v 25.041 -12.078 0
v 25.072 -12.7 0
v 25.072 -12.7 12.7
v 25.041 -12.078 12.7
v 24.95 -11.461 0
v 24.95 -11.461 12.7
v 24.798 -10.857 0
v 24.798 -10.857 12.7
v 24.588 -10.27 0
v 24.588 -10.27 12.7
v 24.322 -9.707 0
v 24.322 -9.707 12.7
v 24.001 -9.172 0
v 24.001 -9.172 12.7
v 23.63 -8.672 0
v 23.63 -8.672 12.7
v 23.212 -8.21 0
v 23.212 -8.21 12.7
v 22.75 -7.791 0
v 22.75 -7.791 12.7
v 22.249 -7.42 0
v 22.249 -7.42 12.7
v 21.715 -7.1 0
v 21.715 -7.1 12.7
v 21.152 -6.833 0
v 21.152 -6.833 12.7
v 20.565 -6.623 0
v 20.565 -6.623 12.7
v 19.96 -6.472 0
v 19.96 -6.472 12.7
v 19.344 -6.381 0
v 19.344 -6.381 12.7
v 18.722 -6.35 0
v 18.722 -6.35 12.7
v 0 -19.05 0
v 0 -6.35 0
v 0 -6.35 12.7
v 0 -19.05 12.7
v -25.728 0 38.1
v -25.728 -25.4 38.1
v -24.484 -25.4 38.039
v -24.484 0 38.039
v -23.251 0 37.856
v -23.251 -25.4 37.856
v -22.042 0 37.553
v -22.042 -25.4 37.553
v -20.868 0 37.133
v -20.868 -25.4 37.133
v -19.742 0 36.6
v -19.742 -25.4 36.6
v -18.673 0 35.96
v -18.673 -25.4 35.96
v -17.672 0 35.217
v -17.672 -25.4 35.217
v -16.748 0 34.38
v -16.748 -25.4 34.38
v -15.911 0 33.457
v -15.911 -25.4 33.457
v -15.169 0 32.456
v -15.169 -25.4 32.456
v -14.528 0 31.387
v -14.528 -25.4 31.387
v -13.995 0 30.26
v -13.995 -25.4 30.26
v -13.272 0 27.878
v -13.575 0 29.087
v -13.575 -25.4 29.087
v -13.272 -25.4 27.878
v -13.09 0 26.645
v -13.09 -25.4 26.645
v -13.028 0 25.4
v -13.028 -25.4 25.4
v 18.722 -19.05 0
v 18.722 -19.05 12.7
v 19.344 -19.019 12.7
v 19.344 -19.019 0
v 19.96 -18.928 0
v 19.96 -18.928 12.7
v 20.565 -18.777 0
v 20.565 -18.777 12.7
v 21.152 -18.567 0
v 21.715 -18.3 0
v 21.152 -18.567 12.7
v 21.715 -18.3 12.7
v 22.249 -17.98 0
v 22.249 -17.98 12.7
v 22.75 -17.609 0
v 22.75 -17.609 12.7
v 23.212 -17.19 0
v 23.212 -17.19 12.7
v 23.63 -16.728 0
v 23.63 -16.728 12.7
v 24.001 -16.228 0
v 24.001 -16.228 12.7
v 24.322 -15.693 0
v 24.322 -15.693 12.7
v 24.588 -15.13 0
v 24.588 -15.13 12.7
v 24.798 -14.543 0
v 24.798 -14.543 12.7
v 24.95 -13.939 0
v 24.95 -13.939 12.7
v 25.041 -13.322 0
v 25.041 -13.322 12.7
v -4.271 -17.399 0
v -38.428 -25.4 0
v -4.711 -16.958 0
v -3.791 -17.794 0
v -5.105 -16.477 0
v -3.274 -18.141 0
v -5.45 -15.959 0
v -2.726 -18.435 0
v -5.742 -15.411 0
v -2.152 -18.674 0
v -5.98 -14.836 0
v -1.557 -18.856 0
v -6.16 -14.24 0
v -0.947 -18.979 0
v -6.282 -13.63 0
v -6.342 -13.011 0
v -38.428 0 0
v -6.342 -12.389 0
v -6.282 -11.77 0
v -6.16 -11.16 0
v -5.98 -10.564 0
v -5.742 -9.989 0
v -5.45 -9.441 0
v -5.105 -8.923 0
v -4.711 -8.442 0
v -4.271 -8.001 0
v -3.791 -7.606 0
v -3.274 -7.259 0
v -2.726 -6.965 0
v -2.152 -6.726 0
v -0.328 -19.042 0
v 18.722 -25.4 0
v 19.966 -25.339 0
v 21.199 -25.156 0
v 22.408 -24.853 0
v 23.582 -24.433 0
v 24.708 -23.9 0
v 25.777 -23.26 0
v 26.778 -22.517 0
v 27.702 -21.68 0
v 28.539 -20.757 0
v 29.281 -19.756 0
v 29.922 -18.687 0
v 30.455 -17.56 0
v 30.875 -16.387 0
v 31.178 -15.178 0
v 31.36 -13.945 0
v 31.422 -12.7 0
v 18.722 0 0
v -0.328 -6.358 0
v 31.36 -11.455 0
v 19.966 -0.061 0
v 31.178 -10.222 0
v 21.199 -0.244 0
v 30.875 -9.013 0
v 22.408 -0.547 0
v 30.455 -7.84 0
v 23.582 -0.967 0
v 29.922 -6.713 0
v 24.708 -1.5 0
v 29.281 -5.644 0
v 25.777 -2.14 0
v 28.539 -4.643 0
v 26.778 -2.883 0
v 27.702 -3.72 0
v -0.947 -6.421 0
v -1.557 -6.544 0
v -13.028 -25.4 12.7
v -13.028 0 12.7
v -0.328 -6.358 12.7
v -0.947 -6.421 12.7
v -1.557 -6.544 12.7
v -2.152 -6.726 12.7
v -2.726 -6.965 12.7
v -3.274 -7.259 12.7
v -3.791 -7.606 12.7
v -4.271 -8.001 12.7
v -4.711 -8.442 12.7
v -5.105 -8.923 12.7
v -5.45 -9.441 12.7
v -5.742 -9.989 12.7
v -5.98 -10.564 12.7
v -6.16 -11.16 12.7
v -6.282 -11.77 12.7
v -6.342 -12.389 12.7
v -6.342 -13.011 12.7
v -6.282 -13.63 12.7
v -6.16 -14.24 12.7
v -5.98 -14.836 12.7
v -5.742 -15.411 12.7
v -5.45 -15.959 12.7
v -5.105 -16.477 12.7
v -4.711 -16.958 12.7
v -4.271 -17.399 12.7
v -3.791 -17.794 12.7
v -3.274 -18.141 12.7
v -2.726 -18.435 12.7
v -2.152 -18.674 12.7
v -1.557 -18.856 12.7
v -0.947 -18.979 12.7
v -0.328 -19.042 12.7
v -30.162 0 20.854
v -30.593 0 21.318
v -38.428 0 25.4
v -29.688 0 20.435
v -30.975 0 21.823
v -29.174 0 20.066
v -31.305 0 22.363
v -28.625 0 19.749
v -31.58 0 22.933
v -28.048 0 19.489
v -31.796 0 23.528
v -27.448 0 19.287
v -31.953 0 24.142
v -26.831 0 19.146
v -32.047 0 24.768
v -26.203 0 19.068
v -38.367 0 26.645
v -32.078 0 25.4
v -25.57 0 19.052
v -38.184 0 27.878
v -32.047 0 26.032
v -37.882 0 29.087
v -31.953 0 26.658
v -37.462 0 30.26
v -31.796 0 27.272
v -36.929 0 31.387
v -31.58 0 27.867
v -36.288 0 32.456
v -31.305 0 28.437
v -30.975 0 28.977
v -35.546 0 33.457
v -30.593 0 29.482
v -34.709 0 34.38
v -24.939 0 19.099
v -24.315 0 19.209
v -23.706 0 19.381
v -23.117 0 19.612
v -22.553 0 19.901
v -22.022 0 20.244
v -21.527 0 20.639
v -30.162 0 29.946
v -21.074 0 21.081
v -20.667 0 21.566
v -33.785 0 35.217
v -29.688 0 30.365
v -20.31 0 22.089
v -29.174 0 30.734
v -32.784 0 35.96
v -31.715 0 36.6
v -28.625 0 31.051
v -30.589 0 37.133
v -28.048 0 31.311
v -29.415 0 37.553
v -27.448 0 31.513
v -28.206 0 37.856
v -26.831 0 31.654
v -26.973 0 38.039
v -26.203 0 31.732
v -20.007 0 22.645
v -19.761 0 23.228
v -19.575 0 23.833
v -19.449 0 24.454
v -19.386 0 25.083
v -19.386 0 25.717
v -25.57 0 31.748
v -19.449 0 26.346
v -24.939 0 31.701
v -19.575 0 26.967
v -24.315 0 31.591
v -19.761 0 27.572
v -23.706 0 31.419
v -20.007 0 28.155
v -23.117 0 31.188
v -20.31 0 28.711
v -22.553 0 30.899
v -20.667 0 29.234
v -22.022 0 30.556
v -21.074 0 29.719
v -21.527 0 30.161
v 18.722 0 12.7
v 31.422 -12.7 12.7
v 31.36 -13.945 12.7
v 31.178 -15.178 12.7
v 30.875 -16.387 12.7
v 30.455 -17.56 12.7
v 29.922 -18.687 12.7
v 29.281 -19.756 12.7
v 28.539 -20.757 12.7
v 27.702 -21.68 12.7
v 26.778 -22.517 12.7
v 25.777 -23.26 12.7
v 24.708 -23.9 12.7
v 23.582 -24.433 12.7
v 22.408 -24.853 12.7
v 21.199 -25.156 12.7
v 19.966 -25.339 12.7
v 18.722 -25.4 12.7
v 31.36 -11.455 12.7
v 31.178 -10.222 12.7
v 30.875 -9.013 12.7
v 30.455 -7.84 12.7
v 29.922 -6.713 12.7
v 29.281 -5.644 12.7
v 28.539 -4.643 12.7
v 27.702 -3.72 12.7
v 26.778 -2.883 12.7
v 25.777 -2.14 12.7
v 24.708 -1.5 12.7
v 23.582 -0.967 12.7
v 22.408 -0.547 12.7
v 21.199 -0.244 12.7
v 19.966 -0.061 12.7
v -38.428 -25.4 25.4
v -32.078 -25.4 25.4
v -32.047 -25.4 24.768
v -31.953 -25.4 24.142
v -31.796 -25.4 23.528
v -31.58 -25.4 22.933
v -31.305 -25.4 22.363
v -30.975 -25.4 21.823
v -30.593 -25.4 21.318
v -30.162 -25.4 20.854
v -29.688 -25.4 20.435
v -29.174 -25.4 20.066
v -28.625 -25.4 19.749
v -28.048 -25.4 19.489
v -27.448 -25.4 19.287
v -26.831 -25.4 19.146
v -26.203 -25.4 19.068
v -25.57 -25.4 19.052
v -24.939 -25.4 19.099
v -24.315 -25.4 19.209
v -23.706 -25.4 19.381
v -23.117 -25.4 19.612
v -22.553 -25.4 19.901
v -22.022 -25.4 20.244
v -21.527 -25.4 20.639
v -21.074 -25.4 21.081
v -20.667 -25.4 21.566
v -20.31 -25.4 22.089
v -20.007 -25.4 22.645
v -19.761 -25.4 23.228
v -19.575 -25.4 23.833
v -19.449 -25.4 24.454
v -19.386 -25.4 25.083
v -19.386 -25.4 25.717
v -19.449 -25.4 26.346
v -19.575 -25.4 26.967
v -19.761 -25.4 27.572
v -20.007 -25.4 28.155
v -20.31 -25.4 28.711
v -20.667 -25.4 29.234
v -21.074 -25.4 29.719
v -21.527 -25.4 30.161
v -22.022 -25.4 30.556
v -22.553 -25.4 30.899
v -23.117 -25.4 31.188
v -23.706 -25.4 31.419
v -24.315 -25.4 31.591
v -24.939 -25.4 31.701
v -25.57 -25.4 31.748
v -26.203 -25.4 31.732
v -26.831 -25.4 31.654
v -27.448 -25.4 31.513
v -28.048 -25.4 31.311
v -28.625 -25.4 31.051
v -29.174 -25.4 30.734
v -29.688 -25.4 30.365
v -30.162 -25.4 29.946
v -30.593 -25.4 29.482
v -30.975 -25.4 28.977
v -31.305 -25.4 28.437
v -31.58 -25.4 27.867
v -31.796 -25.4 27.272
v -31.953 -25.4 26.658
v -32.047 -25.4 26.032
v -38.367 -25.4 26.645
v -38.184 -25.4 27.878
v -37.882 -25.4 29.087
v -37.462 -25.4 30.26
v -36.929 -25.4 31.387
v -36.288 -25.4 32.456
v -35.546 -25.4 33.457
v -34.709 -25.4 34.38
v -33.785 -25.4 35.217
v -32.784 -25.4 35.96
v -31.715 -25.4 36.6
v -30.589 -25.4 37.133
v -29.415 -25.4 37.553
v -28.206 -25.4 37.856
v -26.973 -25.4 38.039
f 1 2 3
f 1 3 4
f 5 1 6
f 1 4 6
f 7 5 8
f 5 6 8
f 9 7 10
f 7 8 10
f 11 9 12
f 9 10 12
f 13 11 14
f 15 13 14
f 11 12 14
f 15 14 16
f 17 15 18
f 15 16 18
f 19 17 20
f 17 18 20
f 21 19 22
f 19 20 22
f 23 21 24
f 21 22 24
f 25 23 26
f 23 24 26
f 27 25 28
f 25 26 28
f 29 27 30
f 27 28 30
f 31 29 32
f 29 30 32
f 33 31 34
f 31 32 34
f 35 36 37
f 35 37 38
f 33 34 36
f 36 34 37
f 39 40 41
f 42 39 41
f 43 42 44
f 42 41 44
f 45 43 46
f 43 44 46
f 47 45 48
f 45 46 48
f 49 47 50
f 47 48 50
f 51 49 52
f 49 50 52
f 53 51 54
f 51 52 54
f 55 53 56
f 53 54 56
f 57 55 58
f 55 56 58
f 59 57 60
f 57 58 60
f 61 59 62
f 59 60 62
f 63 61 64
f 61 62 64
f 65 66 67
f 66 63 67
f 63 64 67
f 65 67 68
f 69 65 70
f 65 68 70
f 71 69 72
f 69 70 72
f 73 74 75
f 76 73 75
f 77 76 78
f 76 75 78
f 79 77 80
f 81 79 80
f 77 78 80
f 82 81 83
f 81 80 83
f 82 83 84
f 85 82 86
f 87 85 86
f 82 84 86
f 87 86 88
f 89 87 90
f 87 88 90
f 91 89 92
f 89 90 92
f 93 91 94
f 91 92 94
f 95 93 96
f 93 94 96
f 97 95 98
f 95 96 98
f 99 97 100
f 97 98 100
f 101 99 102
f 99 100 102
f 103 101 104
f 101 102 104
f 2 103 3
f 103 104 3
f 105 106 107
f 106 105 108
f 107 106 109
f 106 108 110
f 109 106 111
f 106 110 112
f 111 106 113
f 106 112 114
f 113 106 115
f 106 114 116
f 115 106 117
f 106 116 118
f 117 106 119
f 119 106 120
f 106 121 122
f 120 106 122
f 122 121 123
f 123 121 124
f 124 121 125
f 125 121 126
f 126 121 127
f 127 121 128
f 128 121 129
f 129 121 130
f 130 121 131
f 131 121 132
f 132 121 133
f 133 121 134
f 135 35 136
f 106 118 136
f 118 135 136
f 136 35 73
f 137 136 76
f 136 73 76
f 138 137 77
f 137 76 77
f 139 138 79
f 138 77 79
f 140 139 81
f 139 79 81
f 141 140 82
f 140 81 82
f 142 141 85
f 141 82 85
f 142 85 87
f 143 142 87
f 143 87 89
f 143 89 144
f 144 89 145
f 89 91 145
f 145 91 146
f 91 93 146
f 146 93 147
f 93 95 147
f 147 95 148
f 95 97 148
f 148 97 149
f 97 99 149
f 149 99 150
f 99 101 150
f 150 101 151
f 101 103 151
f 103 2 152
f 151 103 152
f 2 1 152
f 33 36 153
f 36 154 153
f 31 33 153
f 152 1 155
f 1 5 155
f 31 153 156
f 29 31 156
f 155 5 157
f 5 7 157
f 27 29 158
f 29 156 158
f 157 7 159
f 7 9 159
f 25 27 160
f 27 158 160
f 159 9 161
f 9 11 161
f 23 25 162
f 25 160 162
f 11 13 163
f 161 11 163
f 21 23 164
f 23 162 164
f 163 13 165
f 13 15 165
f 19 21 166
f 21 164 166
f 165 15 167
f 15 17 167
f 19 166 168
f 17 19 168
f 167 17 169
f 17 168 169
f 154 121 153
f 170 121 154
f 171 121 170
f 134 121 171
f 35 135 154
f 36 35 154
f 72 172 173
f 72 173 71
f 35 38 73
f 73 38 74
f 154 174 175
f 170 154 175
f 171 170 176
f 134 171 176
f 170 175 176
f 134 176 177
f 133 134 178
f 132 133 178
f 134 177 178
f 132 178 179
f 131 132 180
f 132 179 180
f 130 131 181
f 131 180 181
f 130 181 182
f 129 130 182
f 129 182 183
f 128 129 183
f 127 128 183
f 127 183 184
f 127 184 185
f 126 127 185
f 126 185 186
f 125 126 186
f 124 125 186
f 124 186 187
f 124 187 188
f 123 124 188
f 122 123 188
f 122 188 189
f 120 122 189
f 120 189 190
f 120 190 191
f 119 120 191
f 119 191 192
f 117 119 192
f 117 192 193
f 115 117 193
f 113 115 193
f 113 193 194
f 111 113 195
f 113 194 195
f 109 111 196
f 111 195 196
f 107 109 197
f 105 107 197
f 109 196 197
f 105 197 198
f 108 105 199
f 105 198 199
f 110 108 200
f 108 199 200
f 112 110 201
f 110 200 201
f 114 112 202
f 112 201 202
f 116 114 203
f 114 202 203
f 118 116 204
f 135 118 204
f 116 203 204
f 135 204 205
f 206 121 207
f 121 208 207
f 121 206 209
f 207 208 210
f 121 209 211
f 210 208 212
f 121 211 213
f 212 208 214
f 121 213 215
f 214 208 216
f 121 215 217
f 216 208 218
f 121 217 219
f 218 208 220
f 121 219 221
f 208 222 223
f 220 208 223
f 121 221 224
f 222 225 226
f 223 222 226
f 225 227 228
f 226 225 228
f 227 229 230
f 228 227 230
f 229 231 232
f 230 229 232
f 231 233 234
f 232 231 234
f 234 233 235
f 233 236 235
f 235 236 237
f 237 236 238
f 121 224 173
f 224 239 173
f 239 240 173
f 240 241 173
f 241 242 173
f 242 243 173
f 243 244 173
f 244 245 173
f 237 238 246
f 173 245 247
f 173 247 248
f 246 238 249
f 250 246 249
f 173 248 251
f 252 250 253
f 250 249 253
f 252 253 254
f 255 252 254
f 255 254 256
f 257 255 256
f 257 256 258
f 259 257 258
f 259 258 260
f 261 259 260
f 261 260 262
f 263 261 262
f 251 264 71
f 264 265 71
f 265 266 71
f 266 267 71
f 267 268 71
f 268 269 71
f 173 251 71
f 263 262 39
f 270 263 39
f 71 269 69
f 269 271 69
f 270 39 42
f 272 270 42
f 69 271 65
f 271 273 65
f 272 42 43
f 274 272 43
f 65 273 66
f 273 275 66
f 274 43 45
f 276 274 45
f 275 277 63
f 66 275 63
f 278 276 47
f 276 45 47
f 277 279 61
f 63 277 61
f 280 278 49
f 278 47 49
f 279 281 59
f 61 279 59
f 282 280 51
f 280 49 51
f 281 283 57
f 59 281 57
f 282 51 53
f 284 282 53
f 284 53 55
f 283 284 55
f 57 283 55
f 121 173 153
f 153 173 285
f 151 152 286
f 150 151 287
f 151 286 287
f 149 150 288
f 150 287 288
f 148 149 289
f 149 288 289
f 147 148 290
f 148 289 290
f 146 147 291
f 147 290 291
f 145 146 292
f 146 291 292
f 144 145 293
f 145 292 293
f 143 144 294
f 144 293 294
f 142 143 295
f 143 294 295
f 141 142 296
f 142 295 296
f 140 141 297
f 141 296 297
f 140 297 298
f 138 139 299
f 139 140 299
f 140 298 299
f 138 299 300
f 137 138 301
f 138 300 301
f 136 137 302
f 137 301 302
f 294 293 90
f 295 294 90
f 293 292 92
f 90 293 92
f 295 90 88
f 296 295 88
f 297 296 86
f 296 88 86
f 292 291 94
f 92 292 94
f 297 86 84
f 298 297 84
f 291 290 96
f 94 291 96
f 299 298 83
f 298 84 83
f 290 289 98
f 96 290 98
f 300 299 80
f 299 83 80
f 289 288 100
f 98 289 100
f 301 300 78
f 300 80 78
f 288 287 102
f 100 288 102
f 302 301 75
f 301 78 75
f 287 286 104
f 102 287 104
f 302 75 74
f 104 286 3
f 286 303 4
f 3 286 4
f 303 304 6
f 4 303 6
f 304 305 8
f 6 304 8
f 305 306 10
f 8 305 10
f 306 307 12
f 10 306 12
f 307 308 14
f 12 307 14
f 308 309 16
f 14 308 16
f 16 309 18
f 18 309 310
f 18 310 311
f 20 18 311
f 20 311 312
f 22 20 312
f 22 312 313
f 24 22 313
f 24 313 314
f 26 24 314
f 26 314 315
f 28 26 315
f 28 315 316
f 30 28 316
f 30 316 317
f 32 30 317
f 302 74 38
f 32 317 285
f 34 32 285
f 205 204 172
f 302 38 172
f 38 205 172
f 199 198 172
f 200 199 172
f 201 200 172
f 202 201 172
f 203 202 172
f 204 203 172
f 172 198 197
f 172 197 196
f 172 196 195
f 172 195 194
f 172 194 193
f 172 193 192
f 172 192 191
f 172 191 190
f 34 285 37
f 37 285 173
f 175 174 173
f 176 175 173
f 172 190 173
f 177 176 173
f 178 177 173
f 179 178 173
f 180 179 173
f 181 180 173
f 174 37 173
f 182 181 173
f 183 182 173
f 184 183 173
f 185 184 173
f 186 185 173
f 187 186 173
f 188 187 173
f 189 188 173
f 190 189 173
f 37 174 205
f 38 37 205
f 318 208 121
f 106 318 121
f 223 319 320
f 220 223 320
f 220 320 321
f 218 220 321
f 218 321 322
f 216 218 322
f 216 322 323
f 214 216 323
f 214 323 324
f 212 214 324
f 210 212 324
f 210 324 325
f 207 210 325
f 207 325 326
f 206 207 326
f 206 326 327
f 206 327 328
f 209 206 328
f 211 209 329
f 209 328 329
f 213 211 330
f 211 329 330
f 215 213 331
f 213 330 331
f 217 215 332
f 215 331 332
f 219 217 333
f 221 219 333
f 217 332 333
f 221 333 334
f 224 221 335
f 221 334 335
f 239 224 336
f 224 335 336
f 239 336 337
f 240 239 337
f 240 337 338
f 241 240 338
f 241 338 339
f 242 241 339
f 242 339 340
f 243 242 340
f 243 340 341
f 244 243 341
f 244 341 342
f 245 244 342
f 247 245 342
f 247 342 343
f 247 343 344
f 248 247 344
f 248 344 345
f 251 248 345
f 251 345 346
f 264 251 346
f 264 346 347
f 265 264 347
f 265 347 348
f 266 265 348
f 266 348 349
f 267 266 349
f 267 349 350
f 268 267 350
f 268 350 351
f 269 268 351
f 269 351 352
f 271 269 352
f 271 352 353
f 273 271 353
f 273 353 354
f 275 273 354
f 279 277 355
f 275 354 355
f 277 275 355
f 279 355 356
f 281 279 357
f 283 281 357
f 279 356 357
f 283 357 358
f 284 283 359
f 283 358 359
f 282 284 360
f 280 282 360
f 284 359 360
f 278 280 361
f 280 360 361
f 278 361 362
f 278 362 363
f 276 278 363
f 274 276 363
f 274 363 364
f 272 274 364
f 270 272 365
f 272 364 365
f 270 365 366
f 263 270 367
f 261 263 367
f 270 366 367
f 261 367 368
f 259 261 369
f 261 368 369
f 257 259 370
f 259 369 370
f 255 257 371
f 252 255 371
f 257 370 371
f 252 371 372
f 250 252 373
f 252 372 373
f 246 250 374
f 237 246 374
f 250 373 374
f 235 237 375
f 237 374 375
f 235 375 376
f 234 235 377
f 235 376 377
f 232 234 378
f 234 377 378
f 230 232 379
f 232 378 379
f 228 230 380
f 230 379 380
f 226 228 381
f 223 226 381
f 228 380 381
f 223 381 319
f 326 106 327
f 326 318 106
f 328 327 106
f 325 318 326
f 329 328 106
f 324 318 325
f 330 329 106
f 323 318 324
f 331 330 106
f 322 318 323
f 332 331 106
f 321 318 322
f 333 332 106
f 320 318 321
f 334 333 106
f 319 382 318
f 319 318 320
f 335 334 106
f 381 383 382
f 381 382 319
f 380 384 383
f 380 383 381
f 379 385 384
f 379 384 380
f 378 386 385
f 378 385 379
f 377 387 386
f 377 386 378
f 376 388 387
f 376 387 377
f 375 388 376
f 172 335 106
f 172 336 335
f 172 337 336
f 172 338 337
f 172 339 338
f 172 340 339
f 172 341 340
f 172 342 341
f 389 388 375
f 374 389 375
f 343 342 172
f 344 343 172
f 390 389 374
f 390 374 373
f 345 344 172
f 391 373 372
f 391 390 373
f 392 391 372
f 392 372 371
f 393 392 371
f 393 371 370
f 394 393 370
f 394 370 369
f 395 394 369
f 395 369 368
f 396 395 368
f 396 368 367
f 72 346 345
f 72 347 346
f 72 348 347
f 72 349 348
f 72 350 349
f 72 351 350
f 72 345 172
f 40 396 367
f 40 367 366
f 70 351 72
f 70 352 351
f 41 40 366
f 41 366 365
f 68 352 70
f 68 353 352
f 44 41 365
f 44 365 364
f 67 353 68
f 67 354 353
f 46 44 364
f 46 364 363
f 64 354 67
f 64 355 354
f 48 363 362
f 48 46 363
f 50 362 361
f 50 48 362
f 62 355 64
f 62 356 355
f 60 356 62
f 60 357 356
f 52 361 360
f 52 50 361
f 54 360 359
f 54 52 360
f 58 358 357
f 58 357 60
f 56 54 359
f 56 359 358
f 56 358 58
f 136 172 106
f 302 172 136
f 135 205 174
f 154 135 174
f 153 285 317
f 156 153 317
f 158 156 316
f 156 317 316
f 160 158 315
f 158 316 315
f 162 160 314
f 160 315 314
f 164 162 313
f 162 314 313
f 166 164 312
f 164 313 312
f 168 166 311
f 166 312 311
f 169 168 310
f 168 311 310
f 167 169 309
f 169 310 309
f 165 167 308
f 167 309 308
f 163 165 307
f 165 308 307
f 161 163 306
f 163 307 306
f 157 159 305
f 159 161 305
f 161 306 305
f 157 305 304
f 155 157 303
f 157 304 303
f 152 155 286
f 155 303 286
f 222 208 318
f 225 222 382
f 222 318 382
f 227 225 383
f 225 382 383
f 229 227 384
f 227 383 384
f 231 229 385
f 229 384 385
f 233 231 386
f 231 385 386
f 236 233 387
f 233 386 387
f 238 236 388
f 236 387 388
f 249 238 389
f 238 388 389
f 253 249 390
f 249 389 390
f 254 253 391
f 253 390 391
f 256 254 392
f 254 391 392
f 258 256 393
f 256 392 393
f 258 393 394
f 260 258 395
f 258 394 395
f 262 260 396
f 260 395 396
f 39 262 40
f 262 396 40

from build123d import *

# Parameters (mm, degrees)
F1_DEPTH = 25.4
F3_DEPTH = 25.401
F5_DEPTH = 12.701


with BuildPart() as f1:
    # F0 (on Front) → F1 (new body)
    with BuildSketch(Plane.XZ):
        Polygon((-38.4284471544, 38.1), (-38.4284471544, 0), (31.4215528456, 0), (31.4215528456, 12.7), (-13.0284471544, 12.7), (-13.0284471544, 38.1), align=None)
    extrude(amount=F1_DEPTH)

    # F2 (on face) → F3 (cut, through all)
    with BuildSketch(Plane.XZ.offset(25.4)):
        with BuildLine():
            ThreePointArc((-38.4284471544, 25.4), (-34.7087032754, 34.3802561211), (-25.7284471544, 38.1))
            Line((-25.7284471544, 38.1), (-38.4284471544, 38.1))
            Line((-38.4284471544, 38.1), (-38.4284471544, 25.4))
        make_face()
        with BuildLine():
            ThreePointArc((-25.7284471544, 38.1), (-16.7481910333, 34.3802561211), (-13.0284471544, 25.4))
            Line((-13.0284471544, 25.4), (-13.0284471544, 38.1))
            Line((-13.0284471544, 38.1), (-25.7284471544, 38.1))
        make_face()
        with BuildLine():
            Line((-32.0784471544, 25.4), (-19.3784471544, 25.4))
            ThreePointArc((-19.3784471544, 25.4), (-25.7284471544, 31.75), (-32.0784471544, 25.4))
        make_face()
        with BuildLine():
            ThreePointArc((-32.0784471544, 25.4), (-25.7284471544, 19.05), (-19.3784471544, 25.4))
            Line((-19.3784471544, 25.4), (-32.0784471544, 25.4))
        make_face()
    extrude(amount=-F3_DEPTH, mode=Mode.SUBTRACT)

    # F4 (on face) → F5 (cut, through all)
    with BuildSketch(Plane.XY.offset(12.7)):
        with BuildLine():
            ThreePointArc((6.35, -12.7), (4.4901280605, -8.2098719395), (0, -6.35))
            Line((0, -6.35), (0, -19.05))
            ThreePointArc((0, -19.05), (4.4901280605, -17.1901280605), (6.35, -12.7))
        make_face()
        with BuildLine():
            Line((-0.3284471544, -19.0415000171), (-0.3284471544, -6.3584999829))
            ThreePointArc((-0.3284471544, -6.3584999829), (-6.35, -12.7), (-0.3284471544, -19.0415000171))
        make_face()
        with BuildLine():
            Line((18.7215528456, -6.35), (0, -6.35))
            ThreePointArc((0, -6.35), (4.4901280605, -8.2098719395), (6.35, -12.7))
            ThreePointArc((6.35, -12.7), (4.4901280605, -17.1901280605), (0, -19.05))
            Line((0, -19.05), (18.7215528456, -19.05))
            ThreePointArc((18.7215528456, -19.05), (12.3715528456, -12.7), (18.7215528456, -6.35))
        make_face()
        with BuildLine():
            Line((18.7215528456, -19.05), (18.7215528456, -6.35))
            ThreePointArc((18.7215528456, -6.35), (12.3715528456, -12.7), (18.7215528456, -19.05))
        make_face()
        with BuildLine():
            ThreePointArc((25.0715528456, -12.7), (23.2116809062, -8.2098719395), (18.7215528456, -6.35))
            Line((18.7215528456, -6.35), (18.7215528456, -19.05))
            ThreePointArc((18.7215528456, -19.05), (23.2116809062, -17.1901280605), (25.0715528456, -12.7))
        make_face()
        with BuildLine():
            Line((31.4215528456, 0), (18.7215528456, 0))
            ThreePointArc((18.7215528456, 0), (27.7018089667, -3.7197438789), (31.4215528456, -12.7))
            Line((31.4215528456, -12.7), (31.4215528456, 0))
        make_face()
        with BuildLine():
            Line((31.4215528456, -25.4), (31.4215528456, -12.7))
            ThreePointArc((31.4215528456, -12.7), (27.7018089667, -21.6802561211), (18.7215528456, -25.4))
            Line((18.7215528456, -25.4), (31.4215528456, -25.4))
        make_face()
    extrude(amount=-F5_DEPTH, mode=Mode.SUBTRACT)


solid = f1.part
